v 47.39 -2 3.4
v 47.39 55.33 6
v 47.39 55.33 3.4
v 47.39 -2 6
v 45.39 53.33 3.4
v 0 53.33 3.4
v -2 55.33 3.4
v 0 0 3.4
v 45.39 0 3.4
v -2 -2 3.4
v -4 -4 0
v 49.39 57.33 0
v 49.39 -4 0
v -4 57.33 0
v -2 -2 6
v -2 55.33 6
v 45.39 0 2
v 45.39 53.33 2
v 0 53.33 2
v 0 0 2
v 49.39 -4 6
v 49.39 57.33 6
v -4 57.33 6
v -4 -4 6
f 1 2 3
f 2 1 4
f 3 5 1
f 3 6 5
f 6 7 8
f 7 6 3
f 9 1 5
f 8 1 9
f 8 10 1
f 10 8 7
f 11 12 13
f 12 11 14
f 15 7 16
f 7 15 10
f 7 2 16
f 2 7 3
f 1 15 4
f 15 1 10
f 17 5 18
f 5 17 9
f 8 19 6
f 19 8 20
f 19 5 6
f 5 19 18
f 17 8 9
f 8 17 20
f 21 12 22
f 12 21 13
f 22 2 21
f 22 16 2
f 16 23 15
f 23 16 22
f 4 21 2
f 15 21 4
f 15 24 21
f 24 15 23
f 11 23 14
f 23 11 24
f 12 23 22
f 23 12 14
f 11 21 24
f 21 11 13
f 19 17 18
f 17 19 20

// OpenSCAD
xdim = 45.39;
ydim = 53.33;

screw_pos = [
    [3.81, 3.81],
    [41.91, 49.53]
];

wall_t = 2;
wall_h = 1.6;
ledge_t = 2;
ledge_h = 1.4;
base_h = 2;

stem_r = 8.75/2;	
hole_r = 2.75/2;	//for M2 screws
stem_h = base_h + ledge_h;

color("white") base();
color("pink") ledge();
color("red") wall();

module base() {
    cube(size=[xdim, ydim, base_h]);
}

module ledge() {
    xt = -ledge_t;
    yt = -ledge_t;
    xs = xdim + (2 * ledge_t);
    ys = ydim + (2 * ledge_t);
    zs = base_h + ledge_h;
    difference() {
        translate([xt, yt, 0])
            cube(size=[xs, ys, zs]);
        cube(size=[xdim, ydim, 10]);
    } 
}

module wall() {
    xt = -ledge_t - wall_t;
    yt = -ledge_t - wall_t;
    xs = xdim + (2 * ledge_t) + (2 * wall_t);
    ys = ydim + (2 * ledge_t) + (2 * wall_t);
    zs = base_h + ledge_t + wall_t;
    difference() {
        translate([xt, yt, 0])
            cube(size=[xs, ys, zs]);
        translate([-ledge_t, -ledge_t, 0])
            cube(size=[xdim + (2 * ledge_t), ydim + (2 * ledge_t), 10]);
    }
}

module mounting_stem() {
	difference() {
		linear_extrude(stem_h) {
			circle(stem_r);
		}
		translate([0,0,2]) {
			linear_extrude(stem_h + 1) {
				circle(hole_r);
			}
		}
	}
}
